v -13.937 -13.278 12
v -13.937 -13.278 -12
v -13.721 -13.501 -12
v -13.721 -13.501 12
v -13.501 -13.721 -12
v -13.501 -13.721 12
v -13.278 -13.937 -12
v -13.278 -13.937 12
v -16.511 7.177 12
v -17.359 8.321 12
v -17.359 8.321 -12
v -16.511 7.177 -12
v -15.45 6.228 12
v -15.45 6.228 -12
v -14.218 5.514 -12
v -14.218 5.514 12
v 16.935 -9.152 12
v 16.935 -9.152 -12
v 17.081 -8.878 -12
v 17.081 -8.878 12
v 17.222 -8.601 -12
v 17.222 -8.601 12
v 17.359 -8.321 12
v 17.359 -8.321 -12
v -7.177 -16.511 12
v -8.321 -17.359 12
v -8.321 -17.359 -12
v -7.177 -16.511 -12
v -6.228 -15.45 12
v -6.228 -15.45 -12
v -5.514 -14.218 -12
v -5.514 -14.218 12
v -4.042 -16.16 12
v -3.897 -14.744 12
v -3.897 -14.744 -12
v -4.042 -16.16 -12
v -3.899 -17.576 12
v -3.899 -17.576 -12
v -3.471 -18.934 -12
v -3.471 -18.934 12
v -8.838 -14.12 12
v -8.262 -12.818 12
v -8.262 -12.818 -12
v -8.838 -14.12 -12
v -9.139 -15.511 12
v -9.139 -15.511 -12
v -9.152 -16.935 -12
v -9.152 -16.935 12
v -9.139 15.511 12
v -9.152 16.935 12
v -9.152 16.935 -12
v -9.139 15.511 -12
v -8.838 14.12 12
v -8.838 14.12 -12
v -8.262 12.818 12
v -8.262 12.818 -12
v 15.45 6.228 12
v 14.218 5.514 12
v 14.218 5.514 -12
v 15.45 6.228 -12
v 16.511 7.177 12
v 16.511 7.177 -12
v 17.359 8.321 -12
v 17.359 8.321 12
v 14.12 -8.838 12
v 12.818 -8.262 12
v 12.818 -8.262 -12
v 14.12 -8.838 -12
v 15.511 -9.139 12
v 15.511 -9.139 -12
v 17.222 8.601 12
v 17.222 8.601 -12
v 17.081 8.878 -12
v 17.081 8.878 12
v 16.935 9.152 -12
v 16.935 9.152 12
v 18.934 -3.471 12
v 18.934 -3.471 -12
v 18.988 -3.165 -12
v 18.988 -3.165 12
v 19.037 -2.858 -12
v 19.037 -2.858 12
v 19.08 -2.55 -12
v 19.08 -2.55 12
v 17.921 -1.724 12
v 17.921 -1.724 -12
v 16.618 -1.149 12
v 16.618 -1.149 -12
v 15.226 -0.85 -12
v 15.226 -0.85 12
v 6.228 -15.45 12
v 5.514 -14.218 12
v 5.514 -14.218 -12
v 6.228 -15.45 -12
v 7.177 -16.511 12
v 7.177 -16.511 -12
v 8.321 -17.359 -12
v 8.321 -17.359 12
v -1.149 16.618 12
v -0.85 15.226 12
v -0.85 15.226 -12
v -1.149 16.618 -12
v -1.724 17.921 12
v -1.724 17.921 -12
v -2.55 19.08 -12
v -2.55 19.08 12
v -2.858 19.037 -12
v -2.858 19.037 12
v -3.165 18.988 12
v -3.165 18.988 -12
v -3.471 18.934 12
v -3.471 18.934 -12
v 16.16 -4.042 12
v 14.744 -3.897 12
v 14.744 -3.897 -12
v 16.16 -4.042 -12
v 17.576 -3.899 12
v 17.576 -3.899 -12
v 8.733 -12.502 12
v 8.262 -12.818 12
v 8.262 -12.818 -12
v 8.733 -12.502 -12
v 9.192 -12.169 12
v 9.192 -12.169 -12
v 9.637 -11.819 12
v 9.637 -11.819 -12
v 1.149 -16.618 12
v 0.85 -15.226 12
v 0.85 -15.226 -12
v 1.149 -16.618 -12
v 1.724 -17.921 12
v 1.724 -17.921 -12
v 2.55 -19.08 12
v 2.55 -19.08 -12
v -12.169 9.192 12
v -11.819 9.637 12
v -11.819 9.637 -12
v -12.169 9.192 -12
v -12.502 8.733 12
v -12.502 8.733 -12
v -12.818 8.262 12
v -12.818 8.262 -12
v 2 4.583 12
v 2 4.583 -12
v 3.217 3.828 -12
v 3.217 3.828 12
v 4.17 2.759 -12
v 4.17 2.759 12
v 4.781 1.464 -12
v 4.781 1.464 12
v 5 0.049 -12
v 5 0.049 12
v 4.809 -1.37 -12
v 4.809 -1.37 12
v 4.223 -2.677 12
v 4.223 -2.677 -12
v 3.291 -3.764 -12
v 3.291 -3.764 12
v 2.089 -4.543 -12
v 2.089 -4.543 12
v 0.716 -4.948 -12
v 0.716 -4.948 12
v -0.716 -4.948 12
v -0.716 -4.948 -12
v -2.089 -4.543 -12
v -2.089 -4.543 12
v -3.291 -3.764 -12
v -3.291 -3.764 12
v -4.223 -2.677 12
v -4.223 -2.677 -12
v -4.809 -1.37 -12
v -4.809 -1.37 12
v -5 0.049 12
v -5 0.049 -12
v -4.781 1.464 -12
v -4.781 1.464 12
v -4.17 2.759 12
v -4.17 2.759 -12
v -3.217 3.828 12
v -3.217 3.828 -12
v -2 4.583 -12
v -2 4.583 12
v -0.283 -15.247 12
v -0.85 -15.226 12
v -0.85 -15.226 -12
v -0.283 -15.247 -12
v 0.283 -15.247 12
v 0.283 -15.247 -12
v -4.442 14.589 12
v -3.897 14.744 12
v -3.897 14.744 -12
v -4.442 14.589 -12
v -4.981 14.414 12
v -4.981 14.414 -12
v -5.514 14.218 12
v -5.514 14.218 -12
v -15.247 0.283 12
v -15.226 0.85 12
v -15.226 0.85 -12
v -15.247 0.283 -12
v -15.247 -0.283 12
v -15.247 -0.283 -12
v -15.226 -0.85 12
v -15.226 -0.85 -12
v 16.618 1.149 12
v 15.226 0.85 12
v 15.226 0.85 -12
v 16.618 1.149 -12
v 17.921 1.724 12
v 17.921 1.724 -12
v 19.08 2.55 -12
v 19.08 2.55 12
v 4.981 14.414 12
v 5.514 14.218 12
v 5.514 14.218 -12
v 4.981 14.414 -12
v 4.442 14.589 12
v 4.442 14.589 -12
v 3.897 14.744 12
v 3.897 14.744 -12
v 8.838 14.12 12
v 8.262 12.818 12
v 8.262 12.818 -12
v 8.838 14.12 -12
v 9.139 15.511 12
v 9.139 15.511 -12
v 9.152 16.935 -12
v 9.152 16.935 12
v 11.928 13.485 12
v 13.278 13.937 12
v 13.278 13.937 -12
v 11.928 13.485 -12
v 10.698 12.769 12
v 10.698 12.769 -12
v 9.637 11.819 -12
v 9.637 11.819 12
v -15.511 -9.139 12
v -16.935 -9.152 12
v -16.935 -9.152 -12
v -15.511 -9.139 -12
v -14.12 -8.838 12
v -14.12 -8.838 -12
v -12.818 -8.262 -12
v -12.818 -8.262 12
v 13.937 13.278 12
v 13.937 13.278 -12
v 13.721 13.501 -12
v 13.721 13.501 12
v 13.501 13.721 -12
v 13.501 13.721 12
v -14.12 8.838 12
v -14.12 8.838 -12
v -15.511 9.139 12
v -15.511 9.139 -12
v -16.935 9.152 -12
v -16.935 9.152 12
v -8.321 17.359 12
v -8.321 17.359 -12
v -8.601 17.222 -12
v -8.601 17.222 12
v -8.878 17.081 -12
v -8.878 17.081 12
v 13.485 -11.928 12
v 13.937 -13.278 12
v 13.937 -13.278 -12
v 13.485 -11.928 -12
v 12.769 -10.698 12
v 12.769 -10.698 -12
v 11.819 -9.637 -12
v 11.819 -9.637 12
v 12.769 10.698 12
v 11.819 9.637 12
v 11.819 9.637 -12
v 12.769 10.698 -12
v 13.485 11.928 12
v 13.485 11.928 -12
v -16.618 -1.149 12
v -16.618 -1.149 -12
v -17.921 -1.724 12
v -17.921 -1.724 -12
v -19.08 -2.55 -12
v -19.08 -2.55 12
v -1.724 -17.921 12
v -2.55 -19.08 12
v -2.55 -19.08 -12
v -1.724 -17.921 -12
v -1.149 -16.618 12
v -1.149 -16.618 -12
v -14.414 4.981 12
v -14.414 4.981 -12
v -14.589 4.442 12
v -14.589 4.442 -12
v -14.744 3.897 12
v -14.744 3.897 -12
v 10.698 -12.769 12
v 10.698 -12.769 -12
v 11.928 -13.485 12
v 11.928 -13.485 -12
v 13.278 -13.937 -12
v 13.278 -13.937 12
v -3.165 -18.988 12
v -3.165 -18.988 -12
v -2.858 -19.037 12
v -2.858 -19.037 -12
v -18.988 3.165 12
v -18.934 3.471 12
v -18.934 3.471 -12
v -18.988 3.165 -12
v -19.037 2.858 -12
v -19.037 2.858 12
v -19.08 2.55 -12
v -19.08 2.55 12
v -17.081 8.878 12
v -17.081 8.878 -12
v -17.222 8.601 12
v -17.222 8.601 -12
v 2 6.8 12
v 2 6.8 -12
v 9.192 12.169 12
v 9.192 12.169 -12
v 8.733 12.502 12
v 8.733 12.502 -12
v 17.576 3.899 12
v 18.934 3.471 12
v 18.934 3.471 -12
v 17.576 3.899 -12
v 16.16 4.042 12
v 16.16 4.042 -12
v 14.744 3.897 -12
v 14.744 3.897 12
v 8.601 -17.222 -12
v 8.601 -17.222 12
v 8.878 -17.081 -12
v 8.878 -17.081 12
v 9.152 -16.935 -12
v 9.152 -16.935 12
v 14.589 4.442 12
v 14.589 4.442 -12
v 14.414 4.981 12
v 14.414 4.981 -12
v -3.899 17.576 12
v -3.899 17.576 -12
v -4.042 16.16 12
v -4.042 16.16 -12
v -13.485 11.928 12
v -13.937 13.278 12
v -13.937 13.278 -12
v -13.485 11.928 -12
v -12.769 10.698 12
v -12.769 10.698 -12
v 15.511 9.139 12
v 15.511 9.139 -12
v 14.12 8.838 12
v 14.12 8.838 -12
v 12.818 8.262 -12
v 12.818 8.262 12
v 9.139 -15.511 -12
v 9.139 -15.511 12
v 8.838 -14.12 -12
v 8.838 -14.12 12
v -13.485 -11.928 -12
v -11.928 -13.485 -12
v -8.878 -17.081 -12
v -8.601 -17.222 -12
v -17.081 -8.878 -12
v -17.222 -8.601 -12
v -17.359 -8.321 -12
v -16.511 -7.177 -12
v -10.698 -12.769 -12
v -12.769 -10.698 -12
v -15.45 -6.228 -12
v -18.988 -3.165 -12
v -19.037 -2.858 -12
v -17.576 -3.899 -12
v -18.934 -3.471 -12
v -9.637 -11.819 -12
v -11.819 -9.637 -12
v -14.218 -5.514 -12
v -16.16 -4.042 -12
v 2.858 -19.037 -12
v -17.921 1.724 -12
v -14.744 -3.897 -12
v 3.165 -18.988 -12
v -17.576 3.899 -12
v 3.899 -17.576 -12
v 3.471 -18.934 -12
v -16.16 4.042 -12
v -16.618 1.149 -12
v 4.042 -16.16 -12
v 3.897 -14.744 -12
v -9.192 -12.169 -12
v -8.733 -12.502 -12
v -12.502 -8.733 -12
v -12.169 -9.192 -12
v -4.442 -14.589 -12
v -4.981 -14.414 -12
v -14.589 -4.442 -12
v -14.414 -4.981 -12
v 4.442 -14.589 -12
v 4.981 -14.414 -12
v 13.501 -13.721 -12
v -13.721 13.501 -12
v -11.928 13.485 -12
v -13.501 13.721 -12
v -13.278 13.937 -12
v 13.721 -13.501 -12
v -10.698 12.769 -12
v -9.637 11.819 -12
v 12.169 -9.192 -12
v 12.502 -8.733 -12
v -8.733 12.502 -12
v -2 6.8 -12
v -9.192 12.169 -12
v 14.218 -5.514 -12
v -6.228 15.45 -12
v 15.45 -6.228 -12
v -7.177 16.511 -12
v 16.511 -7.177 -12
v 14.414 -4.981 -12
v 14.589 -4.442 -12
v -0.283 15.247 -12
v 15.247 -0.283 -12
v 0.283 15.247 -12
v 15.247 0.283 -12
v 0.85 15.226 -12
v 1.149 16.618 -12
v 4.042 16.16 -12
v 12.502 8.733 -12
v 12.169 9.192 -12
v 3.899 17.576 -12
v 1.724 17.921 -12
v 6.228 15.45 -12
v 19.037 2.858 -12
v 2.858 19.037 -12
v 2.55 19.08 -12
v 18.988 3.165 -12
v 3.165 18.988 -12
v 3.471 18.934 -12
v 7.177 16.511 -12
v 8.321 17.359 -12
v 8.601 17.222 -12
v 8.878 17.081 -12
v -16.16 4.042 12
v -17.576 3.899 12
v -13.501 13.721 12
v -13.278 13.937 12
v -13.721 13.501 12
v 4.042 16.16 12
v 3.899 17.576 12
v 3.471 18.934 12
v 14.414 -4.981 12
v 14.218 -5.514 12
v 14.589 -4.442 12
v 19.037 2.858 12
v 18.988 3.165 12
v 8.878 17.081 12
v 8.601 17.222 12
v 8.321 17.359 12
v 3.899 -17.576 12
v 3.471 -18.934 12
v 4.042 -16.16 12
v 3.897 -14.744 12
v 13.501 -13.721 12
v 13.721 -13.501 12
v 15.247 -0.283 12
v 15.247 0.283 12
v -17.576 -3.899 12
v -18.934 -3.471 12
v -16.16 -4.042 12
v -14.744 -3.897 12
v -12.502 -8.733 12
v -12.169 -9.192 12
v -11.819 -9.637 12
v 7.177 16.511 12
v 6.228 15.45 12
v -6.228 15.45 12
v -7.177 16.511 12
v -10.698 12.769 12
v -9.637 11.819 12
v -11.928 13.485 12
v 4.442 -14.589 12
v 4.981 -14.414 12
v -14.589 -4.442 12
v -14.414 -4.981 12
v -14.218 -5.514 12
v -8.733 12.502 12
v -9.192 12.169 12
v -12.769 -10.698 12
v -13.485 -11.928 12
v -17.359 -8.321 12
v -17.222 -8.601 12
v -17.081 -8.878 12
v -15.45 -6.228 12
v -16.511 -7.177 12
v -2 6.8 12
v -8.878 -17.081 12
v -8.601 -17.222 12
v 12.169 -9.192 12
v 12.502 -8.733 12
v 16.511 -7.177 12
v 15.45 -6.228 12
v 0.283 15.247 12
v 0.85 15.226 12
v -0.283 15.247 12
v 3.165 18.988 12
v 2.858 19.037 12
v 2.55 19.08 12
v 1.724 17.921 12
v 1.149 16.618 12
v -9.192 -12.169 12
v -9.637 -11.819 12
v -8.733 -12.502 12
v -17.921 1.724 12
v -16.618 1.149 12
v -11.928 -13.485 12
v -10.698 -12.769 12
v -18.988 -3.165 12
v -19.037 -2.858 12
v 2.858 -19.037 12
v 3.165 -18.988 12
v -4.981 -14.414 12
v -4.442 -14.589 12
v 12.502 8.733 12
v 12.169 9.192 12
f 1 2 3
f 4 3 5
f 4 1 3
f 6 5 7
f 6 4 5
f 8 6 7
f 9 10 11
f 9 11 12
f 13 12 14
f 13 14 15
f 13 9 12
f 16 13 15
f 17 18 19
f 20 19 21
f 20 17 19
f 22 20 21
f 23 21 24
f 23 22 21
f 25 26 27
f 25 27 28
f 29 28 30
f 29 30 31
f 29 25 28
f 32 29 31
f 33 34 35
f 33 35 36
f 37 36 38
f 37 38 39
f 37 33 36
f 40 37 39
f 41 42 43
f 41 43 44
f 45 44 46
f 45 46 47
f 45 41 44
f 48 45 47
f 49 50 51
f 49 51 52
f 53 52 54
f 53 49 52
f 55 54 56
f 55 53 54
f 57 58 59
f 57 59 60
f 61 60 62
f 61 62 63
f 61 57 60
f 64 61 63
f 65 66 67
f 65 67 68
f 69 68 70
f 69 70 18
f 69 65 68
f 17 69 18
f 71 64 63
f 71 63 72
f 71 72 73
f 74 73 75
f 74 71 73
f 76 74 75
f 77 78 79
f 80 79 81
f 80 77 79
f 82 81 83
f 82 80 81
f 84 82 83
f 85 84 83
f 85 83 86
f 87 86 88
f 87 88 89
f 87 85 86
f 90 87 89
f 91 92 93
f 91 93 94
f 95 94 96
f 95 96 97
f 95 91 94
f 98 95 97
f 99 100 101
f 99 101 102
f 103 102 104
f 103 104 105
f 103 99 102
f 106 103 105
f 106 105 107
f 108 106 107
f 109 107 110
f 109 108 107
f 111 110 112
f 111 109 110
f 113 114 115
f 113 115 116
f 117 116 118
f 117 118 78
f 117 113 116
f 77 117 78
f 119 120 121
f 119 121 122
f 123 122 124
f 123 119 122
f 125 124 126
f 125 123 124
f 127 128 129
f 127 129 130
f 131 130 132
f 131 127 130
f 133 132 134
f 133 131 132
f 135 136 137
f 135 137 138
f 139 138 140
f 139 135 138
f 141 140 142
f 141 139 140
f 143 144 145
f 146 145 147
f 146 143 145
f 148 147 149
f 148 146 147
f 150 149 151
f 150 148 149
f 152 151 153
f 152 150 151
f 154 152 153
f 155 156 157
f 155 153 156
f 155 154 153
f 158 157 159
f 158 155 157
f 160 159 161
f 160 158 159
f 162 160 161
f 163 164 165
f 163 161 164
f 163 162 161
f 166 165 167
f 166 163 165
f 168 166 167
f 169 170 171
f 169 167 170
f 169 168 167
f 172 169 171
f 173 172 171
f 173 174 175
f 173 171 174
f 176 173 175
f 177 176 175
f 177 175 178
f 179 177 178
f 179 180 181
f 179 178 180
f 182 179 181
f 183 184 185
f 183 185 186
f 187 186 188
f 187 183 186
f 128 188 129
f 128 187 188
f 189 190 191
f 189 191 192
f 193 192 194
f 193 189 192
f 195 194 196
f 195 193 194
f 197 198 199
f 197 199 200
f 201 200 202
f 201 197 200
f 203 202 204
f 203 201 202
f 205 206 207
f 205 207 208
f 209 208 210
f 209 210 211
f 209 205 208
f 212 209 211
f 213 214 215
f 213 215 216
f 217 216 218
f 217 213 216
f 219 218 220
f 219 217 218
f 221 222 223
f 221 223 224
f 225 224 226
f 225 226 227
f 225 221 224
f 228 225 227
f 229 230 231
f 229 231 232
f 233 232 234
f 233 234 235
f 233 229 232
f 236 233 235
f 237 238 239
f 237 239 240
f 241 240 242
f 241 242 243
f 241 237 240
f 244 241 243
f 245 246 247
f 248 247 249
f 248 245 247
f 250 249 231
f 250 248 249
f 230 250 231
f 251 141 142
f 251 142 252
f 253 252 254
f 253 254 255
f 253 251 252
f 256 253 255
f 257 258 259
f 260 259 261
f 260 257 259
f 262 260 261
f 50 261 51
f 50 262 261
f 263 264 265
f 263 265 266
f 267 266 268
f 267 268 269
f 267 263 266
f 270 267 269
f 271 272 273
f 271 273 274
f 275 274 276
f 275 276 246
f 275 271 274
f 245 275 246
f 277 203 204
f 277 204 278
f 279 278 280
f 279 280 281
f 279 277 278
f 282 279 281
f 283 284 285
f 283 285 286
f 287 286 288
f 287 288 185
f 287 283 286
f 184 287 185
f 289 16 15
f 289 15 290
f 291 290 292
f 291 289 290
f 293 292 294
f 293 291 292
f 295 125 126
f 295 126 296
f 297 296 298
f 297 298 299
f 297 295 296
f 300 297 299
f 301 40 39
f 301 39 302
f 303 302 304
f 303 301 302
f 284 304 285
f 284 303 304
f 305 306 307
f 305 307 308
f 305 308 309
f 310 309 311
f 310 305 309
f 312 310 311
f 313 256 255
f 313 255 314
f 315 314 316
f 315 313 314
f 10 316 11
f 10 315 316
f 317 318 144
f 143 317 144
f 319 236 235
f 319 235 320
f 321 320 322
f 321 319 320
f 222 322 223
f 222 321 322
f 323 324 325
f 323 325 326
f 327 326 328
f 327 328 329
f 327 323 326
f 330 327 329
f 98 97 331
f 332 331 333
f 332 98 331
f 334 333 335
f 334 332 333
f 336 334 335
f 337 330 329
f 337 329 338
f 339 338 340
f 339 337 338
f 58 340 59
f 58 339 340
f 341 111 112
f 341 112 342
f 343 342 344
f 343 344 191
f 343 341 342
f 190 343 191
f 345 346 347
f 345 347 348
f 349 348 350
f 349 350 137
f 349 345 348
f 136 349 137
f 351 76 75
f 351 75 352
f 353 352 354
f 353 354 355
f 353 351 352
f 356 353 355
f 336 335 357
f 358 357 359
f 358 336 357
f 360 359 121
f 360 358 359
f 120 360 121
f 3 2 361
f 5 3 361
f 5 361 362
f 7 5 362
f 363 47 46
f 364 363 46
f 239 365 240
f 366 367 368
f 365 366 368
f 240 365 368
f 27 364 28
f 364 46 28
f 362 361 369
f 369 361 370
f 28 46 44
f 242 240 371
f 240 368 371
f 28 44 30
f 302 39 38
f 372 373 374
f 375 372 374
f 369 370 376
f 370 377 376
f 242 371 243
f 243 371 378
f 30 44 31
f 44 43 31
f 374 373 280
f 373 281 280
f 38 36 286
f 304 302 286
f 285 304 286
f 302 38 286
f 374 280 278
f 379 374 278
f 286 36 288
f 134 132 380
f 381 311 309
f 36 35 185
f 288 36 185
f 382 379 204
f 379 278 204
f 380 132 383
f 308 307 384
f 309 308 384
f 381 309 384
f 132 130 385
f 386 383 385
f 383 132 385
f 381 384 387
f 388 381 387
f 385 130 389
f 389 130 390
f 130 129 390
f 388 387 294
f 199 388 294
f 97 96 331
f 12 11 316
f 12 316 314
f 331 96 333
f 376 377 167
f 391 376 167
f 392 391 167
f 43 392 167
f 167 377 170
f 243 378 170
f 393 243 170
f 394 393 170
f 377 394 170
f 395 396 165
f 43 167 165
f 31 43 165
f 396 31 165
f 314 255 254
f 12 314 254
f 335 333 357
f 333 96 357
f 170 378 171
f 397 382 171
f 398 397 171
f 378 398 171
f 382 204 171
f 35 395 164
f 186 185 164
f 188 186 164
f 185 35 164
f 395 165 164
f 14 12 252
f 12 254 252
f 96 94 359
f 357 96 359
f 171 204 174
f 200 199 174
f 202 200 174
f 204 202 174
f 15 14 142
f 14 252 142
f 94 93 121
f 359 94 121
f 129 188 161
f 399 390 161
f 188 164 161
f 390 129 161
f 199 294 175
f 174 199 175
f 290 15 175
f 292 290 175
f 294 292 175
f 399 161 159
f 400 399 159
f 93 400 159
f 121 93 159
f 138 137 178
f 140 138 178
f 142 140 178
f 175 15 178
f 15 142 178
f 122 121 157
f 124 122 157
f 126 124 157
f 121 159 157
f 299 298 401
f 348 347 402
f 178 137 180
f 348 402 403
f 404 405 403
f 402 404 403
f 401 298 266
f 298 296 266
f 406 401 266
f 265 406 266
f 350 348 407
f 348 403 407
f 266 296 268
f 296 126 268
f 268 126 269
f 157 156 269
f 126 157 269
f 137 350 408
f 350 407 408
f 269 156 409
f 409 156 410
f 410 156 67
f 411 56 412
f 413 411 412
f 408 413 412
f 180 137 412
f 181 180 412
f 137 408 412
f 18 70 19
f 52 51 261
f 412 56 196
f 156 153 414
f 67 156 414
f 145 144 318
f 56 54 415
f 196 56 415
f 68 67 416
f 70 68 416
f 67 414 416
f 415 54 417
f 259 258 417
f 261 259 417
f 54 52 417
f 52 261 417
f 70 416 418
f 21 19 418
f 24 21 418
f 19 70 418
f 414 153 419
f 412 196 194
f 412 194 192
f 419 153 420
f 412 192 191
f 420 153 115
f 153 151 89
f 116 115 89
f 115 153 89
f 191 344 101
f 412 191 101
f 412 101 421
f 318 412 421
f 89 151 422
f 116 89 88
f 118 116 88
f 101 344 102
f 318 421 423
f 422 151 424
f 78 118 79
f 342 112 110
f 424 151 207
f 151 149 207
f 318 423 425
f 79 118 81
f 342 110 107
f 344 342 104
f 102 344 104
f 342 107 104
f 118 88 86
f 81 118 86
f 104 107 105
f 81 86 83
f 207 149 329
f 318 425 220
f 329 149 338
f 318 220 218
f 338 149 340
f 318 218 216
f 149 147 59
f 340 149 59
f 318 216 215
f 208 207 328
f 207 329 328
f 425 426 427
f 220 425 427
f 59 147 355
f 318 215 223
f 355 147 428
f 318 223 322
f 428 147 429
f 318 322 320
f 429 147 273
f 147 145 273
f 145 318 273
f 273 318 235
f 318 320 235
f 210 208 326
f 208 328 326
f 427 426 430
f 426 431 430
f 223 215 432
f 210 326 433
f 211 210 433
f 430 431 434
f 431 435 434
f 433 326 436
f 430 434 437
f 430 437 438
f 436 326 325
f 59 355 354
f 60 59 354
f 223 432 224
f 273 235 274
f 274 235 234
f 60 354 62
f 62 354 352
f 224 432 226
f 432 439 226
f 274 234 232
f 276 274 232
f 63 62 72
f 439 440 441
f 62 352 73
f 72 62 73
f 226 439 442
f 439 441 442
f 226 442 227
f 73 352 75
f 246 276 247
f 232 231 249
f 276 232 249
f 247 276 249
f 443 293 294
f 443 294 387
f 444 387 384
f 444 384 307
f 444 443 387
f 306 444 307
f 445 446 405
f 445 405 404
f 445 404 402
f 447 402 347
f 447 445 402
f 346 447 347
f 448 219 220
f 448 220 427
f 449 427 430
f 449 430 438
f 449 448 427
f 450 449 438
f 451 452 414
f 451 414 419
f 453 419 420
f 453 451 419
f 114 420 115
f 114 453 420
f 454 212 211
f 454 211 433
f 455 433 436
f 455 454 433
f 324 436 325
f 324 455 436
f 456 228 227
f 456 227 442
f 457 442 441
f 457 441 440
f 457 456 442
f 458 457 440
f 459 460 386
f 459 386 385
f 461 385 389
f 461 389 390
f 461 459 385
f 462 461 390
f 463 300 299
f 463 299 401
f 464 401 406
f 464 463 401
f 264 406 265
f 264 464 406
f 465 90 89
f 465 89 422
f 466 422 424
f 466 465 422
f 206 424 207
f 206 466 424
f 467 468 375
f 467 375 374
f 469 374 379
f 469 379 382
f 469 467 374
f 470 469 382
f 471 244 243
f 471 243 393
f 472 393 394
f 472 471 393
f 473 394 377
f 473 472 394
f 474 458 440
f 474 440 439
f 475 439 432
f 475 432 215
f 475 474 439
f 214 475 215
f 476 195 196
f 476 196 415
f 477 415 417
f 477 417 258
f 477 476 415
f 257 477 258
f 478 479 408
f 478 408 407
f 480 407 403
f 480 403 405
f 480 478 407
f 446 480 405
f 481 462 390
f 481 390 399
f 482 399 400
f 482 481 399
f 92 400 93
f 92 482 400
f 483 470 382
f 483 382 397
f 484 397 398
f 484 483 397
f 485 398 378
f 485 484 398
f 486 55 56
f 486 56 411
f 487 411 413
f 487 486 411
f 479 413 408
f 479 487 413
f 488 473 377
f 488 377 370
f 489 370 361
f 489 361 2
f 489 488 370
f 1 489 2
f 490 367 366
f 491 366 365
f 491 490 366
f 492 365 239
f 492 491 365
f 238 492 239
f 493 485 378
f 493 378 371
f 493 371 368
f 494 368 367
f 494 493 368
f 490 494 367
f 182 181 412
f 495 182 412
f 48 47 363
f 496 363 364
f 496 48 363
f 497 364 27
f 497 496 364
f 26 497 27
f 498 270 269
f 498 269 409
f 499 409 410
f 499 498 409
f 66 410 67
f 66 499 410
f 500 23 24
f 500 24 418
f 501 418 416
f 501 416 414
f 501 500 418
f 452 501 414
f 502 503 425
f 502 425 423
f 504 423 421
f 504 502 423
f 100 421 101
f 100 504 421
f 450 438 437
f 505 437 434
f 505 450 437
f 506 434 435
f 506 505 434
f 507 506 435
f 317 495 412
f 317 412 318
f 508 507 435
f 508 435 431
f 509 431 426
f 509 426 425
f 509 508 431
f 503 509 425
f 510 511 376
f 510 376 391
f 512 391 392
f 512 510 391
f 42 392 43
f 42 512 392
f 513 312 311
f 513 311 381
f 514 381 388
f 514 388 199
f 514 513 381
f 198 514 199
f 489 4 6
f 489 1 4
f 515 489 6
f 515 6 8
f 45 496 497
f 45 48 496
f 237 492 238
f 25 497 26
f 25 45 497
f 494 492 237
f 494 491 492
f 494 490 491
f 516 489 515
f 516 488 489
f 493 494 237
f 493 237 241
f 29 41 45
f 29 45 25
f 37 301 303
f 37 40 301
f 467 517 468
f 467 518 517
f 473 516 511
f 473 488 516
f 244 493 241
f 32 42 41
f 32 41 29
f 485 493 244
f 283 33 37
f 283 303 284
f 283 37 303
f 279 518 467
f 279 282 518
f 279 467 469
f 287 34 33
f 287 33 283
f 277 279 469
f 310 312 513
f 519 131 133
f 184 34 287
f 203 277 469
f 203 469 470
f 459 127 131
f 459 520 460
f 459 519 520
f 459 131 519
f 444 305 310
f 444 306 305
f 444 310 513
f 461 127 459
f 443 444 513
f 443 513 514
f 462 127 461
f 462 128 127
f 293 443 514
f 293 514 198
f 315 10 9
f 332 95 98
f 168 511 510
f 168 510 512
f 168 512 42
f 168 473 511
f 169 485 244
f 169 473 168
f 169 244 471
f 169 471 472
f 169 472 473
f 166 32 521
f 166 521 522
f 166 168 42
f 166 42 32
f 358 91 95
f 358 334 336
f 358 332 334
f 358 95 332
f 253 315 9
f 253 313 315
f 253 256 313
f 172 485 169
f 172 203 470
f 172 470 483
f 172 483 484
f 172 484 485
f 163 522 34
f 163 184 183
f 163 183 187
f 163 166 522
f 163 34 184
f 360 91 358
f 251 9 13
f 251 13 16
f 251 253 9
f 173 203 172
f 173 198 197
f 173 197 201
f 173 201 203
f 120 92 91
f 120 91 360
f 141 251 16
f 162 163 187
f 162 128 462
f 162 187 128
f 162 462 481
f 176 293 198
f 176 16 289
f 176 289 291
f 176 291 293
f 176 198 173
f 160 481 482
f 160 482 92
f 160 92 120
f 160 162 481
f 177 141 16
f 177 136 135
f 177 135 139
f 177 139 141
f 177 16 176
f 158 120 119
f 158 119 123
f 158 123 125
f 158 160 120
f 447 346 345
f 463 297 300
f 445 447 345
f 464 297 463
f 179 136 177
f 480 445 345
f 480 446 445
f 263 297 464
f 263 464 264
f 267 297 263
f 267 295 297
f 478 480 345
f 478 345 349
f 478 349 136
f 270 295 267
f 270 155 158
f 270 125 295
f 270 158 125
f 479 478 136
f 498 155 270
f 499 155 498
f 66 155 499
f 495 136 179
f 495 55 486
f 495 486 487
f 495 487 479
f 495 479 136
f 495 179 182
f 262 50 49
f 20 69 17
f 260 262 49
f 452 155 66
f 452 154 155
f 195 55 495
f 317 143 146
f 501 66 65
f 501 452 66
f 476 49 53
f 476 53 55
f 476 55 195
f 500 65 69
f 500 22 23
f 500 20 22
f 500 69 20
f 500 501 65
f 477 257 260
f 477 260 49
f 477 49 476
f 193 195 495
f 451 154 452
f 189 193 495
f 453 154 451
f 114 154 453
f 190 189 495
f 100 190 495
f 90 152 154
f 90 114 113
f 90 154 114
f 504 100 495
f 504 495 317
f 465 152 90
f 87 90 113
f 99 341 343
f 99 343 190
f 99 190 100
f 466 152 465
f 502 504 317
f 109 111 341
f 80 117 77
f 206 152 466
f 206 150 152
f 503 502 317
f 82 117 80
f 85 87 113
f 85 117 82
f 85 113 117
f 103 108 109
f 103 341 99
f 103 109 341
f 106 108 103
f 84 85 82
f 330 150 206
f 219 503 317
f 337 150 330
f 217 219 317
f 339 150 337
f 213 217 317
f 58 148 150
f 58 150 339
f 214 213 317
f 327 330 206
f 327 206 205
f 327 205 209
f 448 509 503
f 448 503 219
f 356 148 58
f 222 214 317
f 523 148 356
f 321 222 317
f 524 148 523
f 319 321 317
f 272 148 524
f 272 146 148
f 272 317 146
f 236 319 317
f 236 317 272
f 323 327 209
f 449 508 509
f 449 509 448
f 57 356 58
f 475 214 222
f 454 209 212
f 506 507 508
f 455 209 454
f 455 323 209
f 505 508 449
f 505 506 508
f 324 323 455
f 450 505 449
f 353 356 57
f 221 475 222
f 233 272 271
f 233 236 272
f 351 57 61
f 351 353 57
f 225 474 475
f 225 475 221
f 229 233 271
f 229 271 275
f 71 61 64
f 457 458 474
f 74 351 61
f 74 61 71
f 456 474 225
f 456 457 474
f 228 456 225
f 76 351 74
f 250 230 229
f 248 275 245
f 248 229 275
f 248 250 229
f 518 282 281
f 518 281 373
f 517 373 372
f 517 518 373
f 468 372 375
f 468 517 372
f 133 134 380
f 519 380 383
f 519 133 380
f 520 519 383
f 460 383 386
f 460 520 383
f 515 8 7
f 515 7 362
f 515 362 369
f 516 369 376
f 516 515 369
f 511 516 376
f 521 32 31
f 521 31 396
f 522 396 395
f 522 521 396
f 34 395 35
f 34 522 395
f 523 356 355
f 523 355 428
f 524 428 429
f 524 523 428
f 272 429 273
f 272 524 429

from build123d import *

# Parameters (mm, degrees)
SKETCH1_R           = 19.25
BOSS_EXTRUDE1_DEPTH = 12
CUT_EXTRUDE1_DEPTH  = 37.292216796
CIRPATTERN1_COUNT   = 20
CUT_EXTRUDE2_DEPTH  = 37.112601679


with BuildPart() as part:
    # Sketch1 → Boss-Extrude1 (new, symmetric)
    with BuildSketch(Plane.XY):
        Circle(SKETCH1_R)
    extrude(amount=BOSS_EXTRUDE1_DEPTH, both=True)

    # Sketch2 → Cut-Extrude1 (cut, through all)
    with BuildSketch(Plane.XY.offset(12)):
        with BuildLine():
            ThreePointArc((0.85, 15.226293049), (0, 15.25), (-0.85, 15.226293049))
            ThreePointArc((-0.85, 15.226293049), (-1.403219848, 17.284232339), (-2.55, 19.080356391))
            ThreePointArc((-2.55, 19.080356391), (0, 19.25), (2.55, 19.080356391))
            ThreePointArc((2.55, 19.080356391), (1.403219848, 17.284232339), (0.85, 15.226293049))
        make_face()
    cut_extrude1 = extrude(amount=-CUT_EXTRUDE1_DEPTH, mode=Mode.SUBTRACT)

    # CirPattern1: Cut-Extrude1 ×20 about axis
    cirpattern1_axis = Axis((0, 0, 0), (0, 0, 1))
    for i in range(1, CIRPATTERN1_COUNT):
        add(cut_extrude1.rotate(cirpattern1_axis, i * 360 / CIRPATTERN1_COUNT), mode=Mode.SUBTRACT)

    # Sketch3 → Cut-Extrude2 (cut, through all)
    with BuildSketch(Plane.XY.offset(12)):
        with BuildLine():
            Line((2, 6.8), (2, 4.582575695))
            ThreePointArc((2, 4.582575695), (0, -5), (-2, 4.582575695))
            Line((-2, 4.582575695), (-2, 6.8))
            Line((-2, 6.8), (2, 6.8))
        make_face()
    extrude(amount=-CUT_EXTRUDE2_DEPTH, mode=Mode.SUBTRACT)


solid = part.part
